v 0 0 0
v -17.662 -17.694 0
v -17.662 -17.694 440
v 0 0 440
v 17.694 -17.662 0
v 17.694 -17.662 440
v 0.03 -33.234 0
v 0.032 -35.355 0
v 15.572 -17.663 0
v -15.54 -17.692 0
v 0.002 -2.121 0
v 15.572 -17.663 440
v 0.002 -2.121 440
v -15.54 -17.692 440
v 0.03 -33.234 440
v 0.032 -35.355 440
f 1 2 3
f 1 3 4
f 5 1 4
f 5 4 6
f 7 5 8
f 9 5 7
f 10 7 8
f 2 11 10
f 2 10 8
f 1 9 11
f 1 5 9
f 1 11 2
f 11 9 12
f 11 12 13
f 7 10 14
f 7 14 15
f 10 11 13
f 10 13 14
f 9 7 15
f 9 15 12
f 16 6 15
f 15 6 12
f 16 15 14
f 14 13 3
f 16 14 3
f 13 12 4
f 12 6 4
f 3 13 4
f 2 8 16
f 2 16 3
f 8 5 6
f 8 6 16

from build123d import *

# Parameters (mm, degrees)
EXTRUDE_1_DEPTH = 440


with BuildPart() as part:
    # 草圖1 → 填料-伸長1 (new body)
    with BuildSketch(Plane.XY):
        Polygon((0, 0), (17.69379362, -17.661530719), (0.032262901, -35.355324339), (-17.661530719, -17.69379362), align=None)
        Polygon((0.001935774, -2.12131946), (-15.540211259, -17.691857846), (0.030327127, -33.234004879), (15.57247416, -17.663466493), align=None, mode=Mode.SUBTRACT)
    extrude(amount=EXTRUDE_1_DEPTH)


solid = part.part
